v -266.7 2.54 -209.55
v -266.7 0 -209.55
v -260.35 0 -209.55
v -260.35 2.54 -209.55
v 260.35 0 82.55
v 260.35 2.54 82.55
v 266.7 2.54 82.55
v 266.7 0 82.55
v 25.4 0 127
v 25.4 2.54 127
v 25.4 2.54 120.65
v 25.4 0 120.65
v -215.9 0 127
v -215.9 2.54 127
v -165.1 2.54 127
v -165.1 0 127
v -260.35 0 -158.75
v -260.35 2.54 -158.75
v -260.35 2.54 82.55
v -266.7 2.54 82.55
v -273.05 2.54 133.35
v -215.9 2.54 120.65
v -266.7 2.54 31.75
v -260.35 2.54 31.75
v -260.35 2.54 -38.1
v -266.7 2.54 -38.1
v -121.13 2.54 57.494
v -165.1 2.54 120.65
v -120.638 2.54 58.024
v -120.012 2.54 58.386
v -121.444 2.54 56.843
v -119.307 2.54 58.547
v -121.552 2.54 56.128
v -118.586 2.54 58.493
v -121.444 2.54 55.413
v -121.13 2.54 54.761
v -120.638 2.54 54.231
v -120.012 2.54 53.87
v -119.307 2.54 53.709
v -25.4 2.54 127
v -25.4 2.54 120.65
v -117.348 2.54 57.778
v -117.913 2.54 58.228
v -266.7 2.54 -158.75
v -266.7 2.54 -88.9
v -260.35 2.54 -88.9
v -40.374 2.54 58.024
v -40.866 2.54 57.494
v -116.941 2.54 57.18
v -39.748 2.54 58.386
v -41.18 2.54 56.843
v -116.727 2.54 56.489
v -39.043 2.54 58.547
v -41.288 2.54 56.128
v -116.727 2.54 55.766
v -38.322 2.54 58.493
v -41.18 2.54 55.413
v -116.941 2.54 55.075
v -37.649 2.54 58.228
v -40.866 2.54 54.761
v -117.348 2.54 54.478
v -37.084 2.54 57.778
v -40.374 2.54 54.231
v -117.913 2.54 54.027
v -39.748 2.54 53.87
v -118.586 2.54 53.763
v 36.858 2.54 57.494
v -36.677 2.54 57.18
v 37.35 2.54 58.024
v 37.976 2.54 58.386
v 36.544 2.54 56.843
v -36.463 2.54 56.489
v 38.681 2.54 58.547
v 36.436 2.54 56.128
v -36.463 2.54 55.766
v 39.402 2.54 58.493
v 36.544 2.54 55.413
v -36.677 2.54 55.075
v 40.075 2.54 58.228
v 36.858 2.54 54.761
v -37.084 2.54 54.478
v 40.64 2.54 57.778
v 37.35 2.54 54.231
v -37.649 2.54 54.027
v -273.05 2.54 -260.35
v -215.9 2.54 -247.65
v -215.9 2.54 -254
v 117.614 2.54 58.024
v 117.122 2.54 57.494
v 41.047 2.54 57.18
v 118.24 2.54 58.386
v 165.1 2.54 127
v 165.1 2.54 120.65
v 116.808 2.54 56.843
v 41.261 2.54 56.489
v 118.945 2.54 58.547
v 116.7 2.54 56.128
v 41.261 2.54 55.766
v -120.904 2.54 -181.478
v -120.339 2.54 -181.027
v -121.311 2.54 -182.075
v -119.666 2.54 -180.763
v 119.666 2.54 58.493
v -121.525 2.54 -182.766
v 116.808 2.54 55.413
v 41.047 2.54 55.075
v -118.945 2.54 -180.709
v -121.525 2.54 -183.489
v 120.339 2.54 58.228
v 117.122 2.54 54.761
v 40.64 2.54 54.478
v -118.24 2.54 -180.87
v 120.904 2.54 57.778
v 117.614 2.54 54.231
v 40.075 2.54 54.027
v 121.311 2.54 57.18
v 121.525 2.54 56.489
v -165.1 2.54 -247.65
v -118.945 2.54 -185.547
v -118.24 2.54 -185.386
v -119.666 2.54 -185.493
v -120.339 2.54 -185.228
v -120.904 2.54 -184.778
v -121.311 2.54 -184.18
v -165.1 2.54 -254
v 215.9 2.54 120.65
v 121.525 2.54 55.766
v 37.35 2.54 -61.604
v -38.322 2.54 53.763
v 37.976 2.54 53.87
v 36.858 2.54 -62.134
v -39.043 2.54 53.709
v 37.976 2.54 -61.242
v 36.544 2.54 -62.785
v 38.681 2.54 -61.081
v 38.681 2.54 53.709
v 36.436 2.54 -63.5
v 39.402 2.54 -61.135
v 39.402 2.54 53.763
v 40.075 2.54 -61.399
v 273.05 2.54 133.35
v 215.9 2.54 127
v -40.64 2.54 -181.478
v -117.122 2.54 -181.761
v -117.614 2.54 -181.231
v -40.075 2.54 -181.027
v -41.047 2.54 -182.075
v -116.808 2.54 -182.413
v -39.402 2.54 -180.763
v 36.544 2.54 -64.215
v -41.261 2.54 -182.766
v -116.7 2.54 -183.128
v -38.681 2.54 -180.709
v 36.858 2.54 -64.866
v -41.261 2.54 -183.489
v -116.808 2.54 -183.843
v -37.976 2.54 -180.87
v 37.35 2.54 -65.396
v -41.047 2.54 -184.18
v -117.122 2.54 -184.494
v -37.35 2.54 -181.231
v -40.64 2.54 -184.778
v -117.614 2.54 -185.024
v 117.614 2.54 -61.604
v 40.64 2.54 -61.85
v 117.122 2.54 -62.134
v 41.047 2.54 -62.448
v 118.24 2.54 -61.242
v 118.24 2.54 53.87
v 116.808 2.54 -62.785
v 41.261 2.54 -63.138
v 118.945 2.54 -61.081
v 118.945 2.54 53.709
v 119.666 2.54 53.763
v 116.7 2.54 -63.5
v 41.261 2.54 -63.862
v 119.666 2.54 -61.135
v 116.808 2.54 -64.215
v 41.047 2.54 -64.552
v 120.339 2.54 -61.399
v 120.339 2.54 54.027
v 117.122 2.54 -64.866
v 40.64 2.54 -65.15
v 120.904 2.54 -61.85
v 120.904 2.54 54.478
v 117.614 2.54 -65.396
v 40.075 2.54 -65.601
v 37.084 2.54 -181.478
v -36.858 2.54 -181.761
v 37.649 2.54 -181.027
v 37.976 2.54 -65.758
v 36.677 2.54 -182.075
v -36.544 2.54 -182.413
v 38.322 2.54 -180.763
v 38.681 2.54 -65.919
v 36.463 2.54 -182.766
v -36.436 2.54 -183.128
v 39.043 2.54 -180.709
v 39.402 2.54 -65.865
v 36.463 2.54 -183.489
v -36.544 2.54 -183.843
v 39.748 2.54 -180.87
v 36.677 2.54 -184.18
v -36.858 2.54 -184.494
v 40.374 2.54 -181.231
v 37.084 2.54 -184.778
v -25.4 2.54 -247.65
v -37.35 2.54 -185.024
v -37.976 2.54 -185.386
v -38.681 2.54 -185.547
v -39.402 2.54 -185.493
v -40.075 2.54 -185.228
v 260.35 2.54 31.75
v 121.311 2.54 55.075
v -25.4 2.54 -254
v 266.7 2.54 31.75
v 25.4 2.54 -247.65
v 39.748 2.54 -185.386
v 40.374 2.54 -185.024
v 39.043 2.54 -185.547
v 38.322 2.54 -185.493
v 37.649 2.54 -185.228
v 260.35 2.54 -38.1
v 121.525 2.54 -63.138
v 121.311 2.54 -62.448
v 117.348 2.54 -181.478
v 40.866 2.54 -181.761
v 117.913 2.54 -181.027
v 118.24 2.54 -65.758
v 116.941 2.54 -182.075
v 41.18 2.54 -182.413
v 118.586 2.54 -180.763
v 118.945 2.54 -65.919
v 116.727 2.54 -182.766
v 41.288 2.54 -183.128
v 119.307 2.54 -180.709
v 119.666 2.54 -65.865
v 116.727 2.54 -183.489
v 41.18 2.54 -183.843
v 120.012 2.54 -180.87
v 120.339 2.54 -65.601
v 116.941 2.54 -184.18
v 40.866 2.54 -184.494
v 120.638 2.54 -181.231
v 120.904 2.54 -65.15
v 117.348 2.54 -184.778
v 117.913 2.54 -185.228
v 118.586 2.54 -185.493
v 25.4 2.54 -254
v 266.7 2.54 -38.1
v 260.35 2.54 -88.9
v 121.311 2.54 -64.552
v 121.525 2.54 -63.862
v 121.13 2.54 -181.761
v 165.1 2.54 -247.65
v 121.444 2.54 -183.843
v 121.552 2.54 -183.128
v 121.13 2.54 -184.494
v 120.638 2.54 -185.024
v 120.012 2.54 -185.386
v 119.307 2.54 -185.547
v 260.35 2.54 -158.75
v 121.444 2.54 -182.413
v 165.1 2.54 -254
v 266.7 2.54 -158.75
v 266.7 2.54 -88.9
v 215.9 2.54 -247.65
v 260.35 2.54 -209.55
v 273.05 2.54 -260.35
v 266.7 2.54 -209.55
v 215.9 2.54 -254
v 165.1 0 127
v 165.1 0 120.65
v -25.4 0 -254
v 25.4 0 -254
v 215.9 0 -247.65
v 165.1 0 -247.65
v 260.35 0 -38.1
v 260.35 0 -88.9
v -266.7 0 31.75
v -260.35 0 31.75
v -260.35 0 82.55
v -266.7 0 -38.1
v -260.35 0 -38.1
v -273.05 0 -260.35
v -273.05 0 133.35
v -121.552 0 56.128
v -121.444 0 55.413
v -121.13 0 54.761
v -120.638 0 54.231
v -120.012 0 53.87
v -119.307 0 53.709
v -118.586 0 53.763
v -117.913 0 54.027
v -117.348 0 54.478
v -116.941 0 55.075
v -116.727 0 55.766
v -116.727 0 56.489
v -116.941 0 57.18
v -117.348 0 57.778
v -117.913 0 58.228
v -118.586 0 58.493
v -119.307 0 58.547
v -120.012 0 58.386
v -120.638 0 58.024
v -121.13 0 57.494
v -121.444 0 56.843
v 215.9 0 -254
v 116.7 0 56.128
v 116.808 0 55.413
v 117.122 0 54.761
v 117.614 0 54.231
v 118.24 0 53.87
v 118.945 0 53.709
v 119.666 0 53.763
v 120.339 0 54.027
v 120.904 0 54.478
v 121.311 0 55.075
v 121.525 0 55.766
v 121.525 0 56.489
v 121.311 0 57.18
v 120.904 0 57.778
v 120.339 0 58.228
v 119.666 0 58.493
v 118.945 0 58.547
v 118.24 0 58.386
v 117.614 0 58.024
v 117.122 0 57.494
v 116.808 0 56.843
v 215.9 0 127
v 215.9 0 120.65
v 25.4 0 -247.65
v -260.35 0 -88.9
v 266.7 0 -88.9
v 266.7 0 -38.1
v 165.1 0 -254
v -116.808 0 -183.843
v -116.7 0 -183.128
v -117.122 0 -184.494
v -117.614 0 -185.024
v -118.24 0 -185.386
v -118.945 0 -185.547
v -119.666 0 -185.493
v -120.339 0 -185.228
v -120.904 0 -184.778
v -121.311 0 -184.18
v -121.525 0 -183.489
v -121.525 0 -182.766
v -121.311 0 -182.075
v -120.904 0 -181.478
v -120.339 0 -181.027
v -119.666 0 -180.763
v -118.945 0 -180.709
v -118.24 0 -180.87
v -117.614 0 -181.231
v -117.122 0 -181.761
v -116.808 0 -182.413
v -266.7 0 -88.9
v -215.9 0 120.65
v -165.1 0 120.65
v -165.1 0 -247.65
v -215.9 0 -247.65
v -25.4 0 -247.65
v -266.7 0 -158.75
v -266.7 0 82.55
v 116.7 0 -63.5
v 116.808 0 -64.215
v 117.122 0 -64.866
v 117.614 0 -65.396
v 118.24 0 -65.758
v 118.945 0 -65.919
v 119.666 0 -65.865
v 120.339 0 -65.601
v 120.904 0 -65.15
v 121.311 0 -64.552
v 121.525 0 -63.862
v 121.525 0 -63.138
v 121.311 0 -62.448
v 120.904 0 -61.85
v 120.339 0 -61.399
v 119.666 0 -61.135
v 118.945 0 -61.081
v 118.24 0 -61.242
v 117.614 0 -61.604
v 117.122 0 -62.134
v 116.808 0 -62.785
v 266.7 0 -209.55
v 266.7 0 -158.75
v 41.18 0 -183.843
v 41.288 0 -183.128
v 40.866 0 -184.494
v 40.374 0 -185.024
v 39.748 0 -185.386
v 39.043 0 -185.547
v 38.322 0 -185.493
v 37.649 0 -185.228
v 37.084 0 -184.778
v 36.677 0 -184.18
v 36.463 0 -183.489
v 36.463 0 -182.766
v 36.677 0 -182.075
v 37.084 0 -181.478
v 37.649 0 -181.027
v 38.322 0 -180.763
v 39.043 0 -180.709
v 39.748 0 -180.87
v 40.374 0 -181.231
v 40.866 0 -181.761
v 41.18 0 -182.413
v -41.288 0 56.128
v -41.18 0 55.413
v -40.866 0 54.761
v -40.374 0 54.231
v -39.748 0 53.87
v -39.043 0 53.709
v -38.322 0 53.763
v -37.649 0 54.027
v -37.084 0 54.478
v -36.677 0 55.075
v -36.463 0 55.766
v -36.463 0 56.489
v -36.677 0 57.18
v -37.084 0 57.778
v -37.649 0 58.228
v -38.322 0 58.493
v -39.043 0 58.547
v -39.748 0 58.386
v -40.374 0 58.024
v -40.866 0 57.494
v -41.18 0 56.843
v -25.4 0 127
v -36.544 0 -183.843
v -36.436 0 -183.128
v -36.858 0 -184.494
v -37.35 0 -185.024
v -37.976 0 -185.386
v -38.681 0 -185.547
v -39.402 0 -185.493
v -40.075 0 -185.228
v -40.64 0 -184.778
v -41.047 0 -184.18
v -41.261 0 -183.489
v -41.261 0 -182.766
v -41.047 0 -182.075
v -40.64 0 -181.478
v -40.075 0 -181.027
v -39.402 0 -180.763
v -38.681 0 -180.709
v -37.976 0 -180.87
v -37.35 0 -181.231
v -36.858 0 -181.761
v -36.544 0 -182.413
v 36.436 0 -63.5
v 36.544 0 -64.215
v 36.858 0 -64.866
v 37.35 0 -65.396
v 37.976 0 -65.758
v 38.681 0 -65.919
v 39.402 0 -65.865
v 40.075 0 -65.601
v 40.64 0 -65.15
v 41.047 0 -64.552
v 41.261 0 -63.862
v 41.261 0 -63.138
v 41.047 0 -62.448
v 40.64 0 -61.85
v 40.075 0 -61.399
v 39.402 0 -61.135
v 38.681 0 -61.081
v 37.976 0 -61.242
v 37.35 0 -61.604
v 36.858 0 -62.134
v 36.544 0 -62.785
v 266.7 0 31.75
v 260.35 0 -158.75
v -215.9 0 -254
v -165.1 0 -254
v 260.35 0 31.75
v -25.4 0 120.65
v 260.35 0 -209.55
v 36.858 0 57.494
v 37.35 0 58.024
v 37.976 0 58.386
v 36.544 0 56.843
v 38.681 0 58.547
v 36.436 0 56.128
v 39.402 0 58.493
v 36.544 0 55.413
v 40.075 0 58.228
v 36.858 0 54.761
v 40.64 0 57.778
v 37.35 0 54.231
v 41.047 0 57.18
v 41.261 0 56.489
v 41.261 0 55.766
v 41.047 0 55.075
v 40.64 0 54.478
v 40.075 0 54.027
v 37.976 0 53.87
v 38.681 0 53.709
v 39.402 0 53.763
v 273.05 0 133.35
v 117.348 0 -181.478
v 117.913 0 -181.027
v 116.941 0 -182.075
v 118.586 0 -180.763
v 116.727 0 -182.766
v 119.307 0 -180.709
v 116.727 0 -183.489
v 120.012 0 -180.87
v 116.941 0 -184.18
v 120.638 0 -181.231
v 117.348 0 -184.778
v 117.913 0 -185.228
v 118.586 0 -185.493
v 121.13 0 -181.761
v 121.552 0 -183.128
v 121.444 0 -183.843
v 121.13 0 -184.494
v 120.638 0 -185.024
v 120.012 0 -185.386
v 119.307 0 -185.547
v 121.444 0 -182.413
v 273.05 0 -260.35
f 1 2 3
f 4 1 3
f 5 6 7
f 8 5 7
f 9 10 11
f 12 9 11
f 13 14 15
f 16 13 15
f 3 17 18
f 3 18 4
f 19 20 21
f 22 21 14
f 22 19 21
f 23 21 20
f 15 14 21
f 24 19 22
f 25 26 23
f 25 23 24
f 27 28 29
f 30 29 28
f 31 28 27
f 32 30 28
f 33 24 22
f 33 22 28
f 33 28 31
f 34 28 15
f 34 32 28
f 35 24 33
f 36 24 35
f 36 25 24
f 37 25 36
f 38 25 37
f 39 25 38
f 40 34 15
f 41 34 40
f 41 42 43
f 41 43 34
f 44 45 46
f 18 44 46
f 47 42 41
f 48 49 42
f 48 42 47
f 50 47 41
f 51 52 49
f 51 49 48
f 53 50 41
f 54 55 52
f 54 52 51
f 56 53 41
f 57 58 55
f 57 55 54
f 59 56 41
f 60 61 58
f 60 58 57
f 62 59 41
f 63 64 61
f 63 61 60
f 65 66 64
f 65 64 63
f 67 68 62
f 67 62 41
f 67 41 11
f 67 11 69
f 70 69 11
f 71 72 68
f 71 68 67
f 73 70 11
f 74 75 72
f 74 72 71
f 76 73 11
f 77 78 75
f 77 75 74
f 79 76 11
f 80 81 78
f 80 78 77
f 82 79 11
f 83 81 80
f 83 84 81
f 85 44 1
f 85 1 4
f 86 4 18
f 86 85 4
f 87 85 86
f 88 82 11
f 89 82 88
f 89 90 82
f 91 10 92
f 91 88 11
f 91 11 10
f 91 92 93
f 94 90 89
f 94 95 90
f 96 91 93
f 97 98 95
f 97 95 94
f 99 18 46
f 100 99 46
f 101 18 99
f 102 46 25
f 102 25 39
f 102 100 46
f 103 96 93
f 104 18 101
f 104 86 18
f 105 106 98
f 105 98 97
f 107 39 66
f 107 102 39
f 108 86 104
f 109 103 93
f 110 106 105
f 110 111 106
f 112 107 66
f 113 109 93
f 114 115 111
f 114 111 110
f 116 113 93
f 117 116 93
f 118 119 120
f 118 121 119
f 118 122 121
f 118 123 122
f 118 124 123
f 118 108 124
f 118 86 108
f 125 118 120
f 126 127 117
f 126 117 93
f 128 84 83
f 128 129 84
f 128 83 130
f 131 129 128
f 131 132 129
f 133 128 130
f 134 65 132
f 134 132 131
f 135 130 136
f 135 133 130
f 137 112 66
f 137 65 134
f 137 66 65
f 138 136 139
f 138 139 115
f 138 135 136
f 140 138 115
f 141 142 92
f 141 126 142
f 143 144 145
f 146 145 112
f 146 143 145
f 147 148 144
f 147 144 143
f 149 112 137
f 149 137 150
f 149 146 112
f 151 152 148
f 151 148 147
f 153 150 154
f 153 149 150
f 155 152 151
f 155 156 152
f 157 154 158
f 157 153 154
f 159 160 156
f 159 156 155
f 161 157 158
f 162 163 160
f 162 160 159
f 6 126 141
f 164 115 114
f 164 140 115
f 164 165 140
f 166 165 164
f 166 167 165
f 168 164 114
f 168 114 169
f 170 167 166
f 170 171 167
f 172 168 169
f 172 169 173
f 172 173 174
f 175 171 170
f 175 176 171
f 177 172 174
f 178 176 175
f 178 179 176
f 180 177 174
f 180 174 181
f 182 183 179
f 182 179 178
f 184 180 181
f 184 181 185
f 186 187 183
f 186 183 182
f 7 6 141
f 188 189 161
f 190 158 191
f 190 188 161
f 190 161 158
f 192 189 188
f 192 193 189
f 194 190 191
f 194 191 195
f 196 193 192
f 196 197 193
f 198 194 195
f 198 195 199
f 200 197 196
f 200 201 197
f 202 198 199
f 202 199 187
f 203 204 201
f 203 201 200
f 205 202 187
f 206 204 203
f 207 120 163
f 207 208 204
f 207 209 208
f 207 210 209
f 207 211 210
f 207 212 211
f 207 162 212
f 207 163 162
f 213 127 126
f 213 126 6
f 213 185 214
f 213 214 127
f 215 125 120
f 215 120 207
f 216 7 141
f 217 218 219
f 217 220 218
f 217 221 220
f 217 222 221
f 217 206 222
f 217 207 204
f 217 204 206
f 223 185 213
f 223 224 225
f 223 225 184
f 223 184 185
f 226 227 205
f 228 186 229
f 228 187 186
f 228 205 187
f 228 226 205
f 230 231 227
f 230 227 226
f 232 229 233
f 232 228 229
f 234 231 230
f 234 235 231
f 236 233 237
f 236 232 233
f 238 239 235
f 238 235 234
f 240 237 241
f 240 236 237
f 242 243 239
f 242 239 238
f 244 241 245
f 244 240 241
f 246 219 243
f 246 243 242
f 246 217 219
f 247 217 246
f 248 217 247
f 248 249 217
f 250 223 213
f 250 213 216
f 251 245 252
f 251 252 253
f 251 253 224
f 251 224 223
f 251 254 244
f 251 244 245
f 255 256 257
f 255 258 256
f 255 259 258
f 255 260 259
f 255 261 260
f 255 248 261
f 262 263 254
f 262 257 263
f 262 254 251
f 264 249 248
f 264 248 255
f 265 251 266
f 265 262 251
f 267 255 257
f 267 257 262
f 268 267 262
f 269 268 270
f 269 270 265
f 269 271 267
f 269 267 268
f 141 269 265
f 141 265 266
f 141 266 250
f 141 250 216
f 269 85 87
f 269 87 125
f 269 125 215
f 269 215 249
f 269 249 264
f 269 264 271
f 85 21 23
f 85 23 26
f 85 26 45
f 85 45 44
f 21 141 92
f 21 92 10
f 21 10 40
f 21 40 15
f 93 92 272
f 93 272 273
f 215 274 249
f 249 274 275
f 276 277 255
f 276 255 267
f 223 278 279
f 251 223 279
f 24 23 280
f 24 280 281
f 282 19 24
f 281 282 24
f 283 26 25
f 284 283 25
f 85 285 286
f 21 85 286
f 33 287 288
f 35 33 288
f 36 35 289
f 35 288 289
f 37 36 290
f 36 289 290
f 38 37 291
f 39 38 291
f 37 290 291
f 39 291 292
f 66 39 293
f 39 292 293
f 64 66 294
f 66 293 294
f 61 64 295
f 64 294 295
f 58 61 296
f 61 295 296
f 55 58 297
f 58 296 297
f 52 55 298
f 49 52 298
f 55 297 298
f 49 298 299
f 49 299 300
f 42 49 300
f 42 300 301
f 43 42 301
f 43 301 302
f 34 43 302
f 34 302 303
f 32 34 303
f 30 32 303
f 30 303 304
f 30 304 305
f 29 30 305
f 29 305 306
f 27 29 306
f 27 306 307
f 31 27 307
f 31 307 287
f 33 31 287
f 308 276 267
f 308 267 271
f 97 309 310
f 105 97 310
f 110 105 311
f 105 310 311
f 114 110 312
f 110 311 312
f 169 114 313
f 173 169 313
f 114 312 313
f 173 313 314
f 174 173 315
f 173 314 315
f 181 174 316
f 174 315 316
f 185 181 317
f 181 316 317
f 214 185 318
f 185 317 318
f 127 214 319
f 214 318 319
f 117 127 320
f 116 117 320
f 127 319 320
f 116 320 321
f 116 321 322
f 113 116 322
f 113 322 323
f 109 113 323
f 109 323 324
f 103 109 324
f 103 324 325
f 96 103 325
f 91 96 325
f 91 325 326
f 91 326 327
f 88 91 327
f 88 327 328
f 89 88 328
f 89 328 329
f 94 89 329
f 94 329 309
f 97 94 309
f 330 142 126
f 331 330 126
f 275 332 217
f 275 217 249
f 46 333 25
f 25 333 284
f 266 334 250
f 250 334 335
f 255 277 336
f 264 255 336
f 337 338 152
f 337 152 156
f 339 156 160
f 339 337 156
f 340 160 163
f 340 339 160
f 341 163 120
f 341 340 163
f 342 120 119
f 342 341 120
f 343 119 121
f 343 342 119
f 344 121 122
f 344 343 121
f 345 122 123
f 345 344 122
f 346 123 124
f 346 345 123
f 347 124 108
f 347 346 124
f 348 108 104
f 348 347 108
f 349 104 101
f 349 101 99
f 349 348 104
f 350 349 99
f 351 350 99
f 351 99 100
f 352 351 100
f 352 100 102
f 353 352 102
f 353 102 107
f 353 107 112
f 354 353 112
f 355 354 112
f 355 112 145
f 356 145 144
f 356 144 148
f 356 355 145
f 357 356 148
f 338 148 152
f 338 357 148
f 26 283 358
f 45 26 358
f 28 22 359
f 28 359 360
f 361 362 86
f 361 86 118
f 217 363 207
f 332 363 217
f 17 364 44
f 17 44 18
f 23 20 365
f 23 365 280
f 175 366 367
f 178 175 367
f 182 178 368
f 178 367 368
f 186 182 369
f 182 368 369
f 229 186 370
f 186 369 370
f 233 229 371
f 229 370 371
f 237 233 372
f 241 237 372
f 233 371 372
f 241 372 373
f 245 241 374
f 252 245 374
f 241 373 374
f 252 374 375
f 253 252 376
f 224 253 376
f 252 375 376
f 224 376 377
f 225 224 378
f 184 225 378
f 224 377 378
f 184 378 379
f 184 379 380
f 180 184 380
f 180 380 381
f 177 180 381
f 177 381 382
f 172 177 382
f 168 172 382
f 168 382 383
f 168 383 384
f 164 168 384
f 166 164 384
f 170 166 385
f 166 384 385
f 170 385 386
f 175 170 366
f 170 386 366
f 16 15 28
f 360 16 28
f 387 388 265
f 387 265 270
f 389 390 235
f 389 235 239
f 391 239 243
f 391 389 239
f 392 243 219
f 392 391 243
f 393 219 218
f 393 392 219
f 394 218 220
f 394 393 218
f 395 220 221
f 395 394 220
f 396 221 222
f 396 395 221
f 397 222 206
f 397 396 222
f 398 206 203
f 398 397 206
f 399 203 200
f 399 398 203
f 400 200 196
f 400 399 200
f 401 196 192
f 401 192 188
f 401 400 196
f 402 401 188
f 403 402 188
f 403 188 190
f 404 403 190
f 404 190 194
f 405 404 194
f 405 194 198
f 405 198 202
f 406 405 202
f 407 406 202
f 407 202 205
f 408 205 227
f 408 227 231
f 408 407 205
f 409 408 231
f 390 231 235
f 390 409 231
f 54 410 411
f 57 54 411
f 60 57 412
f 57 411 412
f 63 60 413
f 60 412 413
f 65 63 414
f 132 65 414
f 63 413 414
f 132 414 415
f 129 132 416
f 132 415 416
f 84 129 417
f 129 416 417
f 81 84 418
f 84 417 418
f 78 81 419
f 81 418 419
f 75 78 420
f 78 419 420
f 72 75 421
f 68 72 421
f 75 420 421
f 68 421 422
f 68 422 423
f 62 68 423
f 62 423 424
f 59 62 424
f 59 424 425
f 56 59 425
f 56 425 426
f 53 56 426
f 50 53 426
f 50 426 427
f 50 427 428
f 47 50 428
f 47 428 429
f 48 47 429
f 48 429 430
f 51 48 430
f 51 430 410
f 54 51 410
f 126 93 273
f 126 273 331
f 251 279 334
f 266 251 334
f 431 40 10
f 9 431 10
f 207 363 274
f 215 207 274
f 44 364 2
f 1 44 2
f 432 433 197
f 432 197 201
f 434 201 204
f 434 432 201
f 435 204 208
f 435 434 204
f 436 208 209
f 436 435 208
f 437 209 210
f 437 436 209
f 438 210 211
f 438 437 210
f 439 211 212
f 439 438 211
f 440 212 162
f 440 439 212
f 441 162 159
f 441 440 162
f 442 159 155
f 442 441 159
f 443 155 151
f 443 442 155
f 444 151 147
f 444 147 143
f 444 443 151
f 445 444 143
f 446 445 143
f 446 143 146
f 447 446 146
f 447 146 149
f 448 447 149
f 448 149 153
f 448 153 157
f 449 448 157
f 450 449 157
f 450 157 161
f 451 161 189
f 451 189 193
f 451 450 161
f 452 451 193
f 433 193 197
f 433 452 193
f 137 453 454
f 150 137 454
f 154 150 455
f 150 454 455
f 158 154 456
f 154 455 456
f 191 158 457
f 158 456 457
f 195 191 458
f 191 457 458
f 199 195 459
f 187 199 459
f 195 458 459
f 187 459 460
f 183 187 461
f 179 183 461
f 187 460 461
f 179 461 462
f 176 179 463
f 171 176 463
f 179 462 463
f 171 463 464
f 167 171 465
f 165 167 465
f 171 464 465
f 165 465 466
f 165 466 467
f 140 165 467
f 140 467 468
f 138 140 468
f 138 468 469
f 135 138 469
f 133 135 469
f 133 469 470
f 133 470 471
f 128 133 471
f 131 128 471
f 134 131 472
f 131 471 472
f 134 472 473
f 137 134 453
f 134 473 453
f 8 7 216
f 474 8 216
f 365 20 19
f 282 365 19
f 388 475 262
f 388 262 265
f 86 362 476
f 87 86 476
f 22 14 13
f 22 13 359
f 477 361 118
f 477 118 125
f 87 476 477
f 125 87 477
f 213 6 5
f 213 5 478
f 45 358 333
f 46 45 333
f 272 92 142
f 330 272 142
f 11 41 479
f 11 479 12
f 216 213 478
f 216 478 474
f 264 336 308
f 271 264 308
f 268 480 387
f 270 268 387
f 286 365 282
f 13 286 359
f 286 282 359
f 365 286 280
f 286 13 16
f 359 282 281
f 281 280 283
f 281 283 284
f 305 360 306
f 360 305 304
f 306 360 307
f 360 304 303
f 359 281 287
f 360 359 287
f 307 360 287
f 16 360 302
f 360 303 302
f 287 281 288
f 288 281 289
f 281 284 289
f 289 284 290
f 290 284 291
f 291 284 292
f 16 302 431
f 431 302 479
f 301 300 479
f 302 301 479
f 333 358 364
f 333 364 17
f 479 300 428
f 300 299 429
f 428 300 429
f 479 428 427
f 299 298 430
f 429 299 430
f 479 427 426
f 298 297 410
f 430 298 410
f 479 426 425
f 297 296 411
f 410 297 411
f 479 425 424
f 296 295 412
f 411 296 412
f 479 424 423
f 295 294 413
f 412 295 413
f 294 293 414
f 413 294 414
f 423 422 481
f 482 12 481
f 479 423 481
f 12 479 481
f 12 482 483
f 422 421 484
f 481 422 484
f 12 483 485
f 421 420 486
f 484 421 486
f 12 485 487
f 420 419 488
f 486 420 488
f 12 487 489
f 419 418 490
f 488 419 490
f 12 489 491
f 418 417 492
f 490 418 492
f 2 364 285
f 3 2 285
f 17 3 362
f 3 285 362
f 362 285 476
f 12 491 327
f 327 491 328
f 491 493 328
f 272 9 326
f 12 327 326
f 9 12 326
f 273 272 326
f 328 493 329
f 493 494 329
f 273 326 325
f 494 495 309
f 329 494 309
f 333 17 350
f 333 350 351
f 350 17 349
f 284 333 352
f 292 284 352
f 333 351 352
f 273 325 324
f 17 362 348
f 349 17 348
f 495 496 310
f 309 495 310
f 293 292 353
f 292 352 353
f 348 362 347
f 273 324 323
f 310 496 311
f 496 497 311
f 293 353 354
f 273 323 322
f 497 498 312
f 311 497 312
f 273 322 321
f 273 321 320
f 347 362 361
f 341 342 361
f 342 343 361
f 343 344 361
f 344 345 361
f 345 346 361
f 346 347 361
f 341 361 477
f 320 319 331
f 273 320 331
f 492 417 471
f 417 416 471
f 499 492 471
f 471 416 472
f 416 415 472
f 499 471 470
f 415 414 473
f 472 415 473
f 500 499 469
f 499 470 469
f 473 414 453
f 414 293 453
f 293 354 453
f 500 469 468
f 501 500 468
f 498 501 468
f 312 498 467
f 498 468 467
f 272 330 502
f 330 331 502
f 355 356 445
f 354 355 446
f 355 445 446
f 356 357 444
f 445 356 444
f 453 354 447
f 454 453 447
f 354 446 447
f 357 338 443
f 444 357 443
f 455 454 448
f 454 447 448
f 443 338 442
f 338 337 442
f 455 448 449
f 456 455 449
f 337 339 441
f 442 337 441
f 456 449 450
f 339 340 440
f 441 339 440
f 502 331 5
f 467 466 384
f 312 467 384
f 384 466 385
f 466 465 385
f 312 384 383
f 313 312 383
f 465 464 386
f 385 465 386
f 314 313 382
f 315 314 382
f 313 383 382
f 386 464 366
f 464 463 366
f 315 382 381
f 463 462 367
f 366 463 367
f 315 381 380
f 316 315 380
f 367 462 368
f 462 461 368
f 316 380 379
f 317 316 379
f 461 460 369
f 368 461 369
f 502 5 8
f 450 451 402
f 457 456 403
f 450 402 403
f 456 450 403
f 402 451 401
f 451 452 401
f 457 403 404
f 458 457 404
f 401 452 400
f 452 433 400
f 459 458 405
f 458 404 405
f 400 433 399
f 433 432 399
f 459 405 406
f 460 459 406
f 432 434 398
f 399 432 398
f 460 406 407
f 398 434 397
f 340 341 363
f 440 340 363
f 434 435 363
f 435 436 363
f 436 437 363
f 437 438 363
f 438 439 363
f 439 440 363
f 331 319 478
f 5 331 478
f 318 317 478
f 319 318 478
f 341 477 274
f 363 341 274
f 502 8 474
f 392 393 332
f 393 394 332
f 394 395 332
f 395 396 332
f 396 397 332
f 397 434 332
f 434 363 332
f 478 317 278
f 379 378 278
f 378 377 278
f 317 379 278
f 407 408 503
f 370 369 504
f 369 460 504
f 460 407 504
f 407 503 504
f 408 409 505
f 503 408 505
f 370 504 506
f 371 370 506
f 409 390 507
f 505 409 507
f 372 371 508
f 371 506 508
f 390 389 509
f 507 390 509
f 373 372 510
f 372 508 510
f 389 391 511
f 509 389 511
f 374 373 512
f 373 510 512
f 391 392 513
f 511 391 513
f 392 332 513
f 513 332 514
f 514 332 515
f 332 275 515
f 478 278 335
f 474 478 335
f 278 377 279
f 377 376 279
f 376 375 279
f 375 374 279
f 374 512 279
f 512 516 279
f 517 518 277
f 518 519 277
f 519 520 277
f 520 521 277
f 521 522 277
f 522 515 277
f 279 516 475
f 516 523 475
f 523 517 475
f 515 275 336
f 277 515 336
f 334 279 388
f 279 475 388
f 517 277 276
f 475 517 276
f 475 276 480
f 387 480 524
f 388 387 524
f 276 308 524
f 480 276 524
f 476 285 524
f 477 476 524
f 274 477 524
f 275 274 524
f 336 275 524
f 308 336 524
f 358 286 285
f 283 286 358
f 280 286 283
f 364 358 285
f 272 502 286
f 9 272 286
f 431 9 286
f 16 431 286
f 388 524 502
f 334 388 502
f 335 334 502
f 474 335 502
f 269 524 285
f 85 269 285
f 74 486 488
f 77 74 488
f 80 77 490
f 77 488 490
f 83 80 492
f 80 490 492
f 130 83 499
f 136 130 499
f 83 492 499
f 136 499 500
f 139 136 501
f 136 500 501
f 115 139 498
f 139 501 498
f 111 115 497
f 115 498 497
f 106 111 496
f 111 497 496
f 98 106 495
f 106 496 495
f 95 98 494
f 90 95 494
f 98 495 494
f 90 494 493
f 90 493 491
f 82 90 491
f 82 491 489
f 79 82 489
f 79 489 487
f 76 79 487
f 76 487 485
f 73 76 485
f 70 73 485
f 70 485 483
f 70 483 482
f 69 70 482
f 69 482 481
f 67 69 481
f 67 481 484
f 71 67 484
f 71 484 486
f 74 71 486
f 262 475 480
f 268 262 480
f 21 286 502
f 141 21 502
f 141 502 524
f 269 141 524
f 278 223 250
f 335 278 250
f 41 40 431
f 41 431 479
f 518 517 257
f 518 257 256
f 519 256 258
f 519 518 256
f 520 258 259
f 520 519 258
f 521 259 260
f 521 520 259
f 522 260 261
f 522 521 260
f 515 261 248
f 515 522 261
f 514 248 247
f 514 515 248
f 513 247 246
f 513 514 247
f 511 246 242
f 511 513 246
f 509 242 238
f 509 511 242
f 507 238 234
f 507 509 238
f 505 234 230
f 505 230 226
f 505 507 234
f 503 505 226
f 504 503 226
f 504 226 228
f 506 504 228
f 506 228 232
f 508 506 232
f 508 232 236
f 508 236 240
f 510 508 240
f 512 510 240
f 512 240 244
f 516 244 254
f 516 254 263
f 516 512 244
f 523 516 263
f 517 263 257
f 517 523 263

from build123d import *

# Parameters (mm, degrees)
BOSS_EXTRUDE1_DEPTH         = 2.54
F_11_0_191_DIAMETER_HOLE2_D = 4.8514
F_11_0_191_DIAMETER_HOLE3_D = 4.8514
SKETCH17_W                  = 6.35
SKETCH17_H                  = 50.8
SKETCH17_W_2                = 50.8
SKETCH17_H_2                = 6.35
SKETCH17_H_3                = 25.4
CUT_EXTRUDE12_DEPTH         = 304.883162745


with BuildPart() as part:
    # Sketch1 → Boss-Extrude1 (new body)
    with BuildSketch(Plane(origin=(0, 0, 0), x_dir=(1, 0, 0), z_dir=(0, 1, 0))):
        Polygon((0, 63.5), (-273.05, 63.5), (-273.05, -63.5), (-273.05, -133.35), (273.05, -133.35), (273.05, -63.5), (273.05, 63.5), align=None)
    boss_extrude1 = extrude(amount=BOSS_EXTRUDE1_DEPTH)

    # #11 (0.191) Diameter Hole2 (through all)
    with Locations(Plane(origin=(0, 2.54, 0), x_dir=(1, 0, 0), z_dir=(0, 1, 0))):
        with Locations((-119.126, -56.127777467), (-38.862, -56.127777467), (38.862, -56.127777467), (119.126, -56.127777467)):
            f_11_0_191_diameter_hole2 = Hole(F_11_0_191_DIAMETER_HOLE2_D / 2)

    # #11 (0.191) Diameter Hole3 (through all)
    with Locations(Plane(origin=(0, 2.54, 0), x_dir=(1, 0, 0), z_dir=(0, 1, 0))):
        with Locations((119.126, 63.5), (38.862, 63.5)):
            f_11_0_191_diameter_hole3 = Hole(F_11_0_191_DIAMETER_HOLE3_D / 2)

    # Sketch17 → Cut-Extrude12 (cut, through all)
    with BuildSketch(Plane(origin=(0, 2.54, 0), x_dir=(1, 0, 0), z_dir=(0, 1, 0))):
        with Locations((-263.525, -57.15)):
            Rectangle(SKETCH17_W, SKETCH17_H)
        with Locations((-190.5, -123.825)):
            Rectangle(SKETCH17_W_2, SKETCH17_H_2)
        with Locations((190.5, -123.825)):
            Rectangle(SKETCH17_W_2, SKETCH17_H_2)
        with Locations((263.525, -57.15)):
            Rectangle(SKETCH17_W, SKETCH17_H)
        with Locations((0, -123.825)):
            Rectangle(SKETCH17_W_2, SKETCH17_H_2)
        with Locations((-263.525, 50.8)):
            Rectangle(SKETCH17_W, SKETCH17_H_3)
        with Locations((263.525, 50.8)):
            Rectangle(SKETCH17_W, SKETCH17_H_3)
    cut_extrude12 = extrude(amount=-CUT_EXTRUDE12_DEPTH, mode=Mode.SUBTRACT)

    # Mirror1: Boss-Extrude1, #11 (0.191) Diameter Hole2, #11 (0.191) Diameter Hole3, Cut-Extrude12 across plane
    add(boss_extrude1.mirror(Plane(origin=(0, 2.54, -63.5), x_dir=(1, 0, 0), z_dir=(0, 0, -1))))
    add(f_11_0_191_diameter_hole2.mirror(Plane(origin=(0, 2.54, -63.5), x_dir=(1, 0, 0), z_dir=(0, 0, -1))), mode=Mode.SUBTRACT)
    add(f_11_0_191_diameter_hole3.mirror(Plane(origin=(0, 2.54, -63.5), x_dir=(1, 0, 0), z_dir=(0, 0, -1))), mode=Mode.SUBTRACT)
    add(cut_extrude12.mirror(Plane(origin=(0, 2.54, -63.5), x_dir=(1, 0, 0), z_dir=(0, 0, -1))), mode=Mode.SUBTRACT)


solid = part.part
